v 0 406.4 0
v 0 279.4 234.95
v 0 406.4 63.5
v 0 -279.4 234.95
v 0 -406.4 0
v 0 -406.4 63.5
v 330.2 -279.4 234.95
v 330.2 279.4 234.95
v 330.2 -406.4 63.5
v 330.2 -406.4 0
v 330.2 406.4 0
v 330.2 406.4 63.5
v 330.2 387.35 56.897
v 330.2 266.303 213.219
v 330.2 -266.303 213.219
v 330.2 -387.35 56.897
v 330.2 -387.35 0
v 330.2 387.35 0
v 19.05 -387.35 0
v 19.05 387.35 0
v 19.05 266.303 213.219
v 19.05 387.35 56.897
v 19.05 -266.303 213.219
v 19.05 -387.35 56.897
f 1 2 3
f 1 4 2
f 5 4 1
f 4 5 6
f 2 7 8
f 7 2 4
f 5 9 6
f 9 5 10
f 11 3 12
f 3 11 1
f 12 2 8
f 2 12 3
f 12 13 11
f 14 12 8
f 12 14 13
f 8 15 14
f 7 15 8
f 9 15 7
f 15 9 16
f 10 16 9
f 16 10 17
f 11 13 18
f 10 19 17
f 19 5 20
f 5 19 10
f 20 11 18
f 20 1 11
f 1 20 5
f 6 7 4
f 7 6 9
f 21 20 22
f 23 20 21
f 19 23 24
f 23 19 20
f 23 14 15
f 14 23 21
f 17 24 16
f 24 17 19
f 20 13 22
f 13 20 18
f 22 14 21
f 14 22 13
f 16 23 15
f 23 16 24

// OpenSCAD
// file: ../lib/colors.scad
module color_wood() {
  color("#F8D89D")
    children();
}

module color_hdpe() {
  color("#ccd")
    children();
}

module color_steel() {
  color("#888")
    children();
}

module color_white() {
  color("#fafafa")
    children();
}

module color_black() {
  color("#333")
    children();
}

module color_outside() {
  color("#90b0c4")
    children();
}
// file: ../lib/convert.scad
function inches(in) = in * 25.4;
function feet(ft) = inches(ft * 12);
// main file
use <../lib/convert.scad>
use <../lib/colors.scad>

wheel_well_top_width = inches(22);
wheel_well_base_width = inches(32);
wheel_well_depth = inches(13);
wheel_well_base_thickness = inches(2.5);
wheel_well_height = inches(6) + wheel_well_base_thickness;


module wheel_well_cutout() {
  translate([0, 0, -1])
  translate([0, wheel_well_base_width / -2, 0])
  cube([wheel_well_depth + 1, wheel_well_base_width, wheel_well_base_thickness + 2]);
}

module wheel_well_shape() {
  color_wood()
  translate([0, wheel_well_base_width / -2, 0])
  hull() {
    translate([0, (wheel_well_base_width - wheel_well_top_width) / 2, wheel_well_height])
      cube([wheel_well_depth, wheel_well_top_width, inches(0.75)]);

    cube([wheel_well_depth, wheel_well_base_width, wheel_well_base_thickness]);
  }
}

module wheel_well_inside() {
  scale_y = (wheel_well_base_width - inches(1.5)) / wheel_well_base_width;
  scale_z = (wheel_well_height - inches(0.75)) / wheel_well_height;

  color_black()
  scale([1, scale_y, scale_z])
    wheel_well_shape();
}

module wheel_well() {
  difference() {
    wheel_well_shape();

    translate([inches(0.75), 0, -1])
      wheel_well_inside();
  }
}

wheel_well();
